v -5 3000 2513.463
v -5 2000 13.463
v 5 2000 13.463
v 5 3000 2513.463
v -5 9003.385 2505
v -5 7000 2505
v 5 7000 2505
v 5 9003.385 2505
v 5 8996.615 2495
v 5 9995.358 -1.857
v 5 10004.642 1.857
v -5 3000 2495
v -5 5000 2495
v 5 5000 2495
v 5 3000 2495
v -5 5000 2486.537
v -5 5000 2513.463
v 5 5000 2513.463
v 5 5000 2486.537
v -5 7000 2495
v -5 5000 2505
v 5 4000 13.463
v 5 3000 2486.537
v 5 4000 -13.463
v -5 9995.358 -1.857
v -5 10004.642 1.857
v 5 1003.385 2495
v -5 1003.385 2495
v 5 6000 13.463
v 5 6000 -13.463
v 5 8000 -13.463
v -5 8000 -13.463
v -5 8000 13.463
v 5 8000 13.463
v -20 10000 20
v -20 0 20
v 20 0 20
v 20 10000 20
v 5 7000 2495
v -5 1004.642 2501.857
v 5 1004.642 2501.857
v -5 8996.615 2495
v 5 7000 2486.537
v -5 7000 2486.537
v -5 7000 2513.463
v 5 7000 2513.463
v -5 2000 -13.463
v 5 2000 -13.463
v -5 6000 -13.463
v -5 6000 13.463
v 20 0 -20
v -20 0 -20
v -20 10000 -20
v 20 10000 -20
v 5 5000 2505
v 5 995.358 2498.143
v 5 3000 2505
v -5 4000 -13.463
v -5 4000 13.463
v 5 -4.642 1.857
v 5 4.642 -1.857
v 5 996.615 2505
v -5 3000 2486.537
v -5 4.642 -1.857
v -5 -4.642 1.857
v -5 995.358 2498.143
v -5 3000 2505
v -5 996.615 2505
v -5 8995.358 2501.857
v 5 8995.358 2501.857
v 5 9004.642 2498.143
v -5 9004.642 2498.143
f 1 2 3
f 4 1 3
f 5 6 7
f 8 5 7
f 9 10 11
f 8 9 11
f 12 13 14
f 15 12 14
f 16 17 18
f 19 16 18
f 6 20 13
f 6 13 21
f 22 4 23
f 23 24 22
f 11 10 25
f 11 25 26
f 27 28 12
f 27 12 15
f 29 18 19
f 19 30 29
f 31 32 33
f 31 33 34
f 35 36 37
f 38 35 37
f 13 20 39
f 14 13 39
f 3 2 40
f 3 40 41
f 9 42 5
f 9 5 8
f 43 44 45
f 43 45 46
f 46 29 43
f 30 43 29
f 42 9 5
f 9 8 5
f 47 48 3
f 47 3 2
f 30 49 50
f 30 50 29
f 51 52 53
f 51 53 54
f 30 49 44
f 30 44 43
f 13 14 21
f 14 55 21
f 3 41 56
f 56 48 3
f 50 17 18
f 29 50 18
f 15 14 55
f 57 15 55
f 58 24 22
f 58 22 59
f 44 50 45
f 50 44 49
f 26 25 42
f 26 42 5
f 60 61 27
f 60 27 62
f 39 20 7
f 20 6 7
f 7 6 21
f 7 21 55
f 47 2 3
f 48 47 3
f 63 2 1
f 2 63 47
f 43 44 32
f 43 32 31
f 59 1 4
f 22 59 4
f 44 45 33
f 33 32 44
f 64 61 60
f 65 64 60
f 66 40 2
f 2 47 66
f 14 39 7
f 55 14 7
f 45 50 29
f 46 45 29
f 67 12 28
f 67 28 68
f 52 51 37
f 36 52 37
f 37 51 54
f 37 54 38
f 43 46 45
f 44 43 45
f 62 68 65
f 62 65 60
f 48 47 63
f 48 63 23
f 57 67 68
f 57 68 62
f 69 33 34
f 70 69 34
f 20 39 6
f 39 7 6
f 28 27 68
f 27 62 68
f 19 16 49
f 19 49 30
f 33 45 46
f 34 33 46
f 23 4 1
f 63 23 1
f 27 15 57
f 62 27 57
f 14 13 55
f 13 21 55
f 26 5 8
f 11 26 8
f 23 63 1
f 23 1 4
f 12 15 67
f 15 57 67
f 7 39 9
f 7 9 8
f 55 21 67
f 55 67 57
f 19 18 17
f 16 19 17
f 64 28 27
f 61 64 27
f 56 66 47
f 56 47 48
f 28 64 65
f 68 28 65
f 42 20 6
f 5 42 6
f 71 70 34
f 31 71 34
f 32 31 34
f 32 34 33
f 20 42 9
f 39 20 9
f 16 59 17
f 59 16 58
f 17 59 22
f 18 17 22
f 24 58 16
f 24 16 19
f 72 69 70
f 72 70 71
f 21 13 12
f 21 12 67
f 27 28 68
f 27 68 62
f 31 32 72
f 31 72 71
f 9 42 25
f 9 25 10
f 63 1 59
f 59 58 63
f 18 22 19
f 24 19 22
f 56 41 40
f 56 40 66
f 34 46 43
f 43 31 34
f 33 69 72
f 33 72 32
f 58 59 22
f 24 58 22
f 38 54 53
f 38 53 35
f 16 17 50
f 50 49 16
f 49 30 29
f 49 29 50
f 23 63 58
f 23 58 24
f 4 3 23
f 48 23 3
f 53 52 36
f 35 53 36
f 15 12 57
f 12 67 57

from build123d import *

# Parameters (mm, degrees)
SKETCH150_W                    = 40
SKETCH150_H                    = 40
HW5_SMALLBEAM40_1_DEPTH        = 10000
SKETCH144_W                    = 10
SKETCH144_H                    = 10
HW5_SMALLBEAM10_1_DEPTH        = 2698.369749548
SKETCH144_ON_SEGMENT_2_W       = 10
SKETCH144_ON_SEGMENT_2_H       = 10
HW5_SMALLBEAM10_1_2_DEPTH      = 2006.787345981
SKETCH144_ON_SEGMENT_3_W       = 10
SKETCH144_ON_SEGMENT_3_H       = 10
HW5_SMALLBEAM10_1_3_DEPTH      = 2002
SKETCH144_ON_SEGMENT_4_W       = 10
SKETCH144_ON_SEGMENT_4_H       = 10
HW5_SMALLBEAM10_1_4_DEPTH      = 2002
SKETCH144_ON_SEGMENT_5_W       = 10
SKETCH144_ON_SEGMENT_5_H       = 10
HW5_SMALLBEAM10_1_5_DEPTH      = 2006.787345981
SKETCH144_ON_SEGMENT_6_W       = 10
SKETCH144_ON_SEGMENT_6_H       = 10
HW5_SMALLBEAM10_1_6_DEPTH      = 2698.369749548
SKETCH147_ON_SEGMENT_1_W       = 10
SKETCH147_ON_SEGMENT_1_H       = 10
HW5_SMALLBEAM10_2_DEPTH        = 2711.260073097
SKETCH147_ON_SEGMENT_2_W       = 10
SKETCH147_ON_SEGMENT_2_H       = 10
HW5_SMALLBEAM10_2_2_DEPTH      = 2729.937742627
SKETCH147_ON_SEGMENT_3_W       = 10
SKETCH147_ON_SEGMENT_3_H       = 10
HW5_SMALLBEAM10_2_3_DEPTH      = 2729.937742627
SKETCH147_ON_SEGMENT_4_W       = 10
SKETCH147_ON_SEGMENT_4_H       = 10
HW5_SMALLBEAM10_2_4_DEPTH      = 2729.937742627
SKETCH147_ON_SEGMENT_5_W       = 10
SKETCH147_ON_SEGMENT_5_H       = 10
HW5_SMALLBEAM10_2_5_DEPTH      = 2729.937742627
SKETCH147_ON_SEGMENT_6_W       = 10
SKETCH147_ON_SEGMENT_6_H       = 10
HW5_SMALLBEAM10_2_6_DEPTH      = 2729.937742627
SKETCH147_ON_SEGMENT_7_W       = 10
SKETCH147_ON_SEGMENT_7_H       = 10
HW5_SMALLBEAM10_2_7_DEPTH      = 2729.937742627
HW5_SMALLBEAM10_2_8_DEPTH      = 2692.582403567
HW5_SMALLBEAM10_2_8_DEPTH_BACK = 18.67766953
SKETCH147_W                    = 10
SKETCH147_H                    = 10


with BuildPart() as part:
    # Sketch150 → Hw5 SMALLBEAM40(1) (new body)
    with BuildSketch(Plane.ZX):
        Rectangle(SKETCH150_W, SKETCH150_H)
    extrude(amount=HW5_SMALLBEAM40_1_DEPTH)


with BuildPart() as body_2:
    # Sketch144 → Hw5 SMALLBEAM10(1) (new body)
    with BuildSketch(Plane(origin=(0, 0, 0), x_dir=(0, -0.9284766908852594, 0.3713906763541039), z_dir=(0, 0.3713906763541039, 0.9284766908852594))):
        Rectangle(SKETCH144_W, SKETCH144_H)
    extrude(amount=HW5_SMALLBEAM10_1_DEPTH)

    # Hw5 SMALLBEAM10(1) mitre 1
    split(bisect_by=Plane(origin=(0, 1000, 2500), x_dir=(1, 0, 0), z_dir=(0, -0.82806723, -0.560628809)), keep=Keep.TOP)


with BuildPart() as body_3:
    # Sketch144 on segment 2 (carried to segment 2) → Hw5 SMALLBEAM10_1 2 (new body)
    with BuildSketch(Plane(origin=(0, 994.212654019, 2500), x_dir=(0, 0, 1), z_dir=(0, 1, 0))):
        Rectangle(SKETCH144_ON_SEGMENT_2_W, SKETCH144_ON_SEGMENT_2_H)
    extrude(amount=HW5_SMALLBEAM10_1_2_DEPTH)

    # Hw5 SMALLBEAM10_1 2 mitre 1
    split(bisect_by=Plane(origin=(0, 3000, 2500), x_dir=(1, 0, 0), z_dir=(0, -1, 0)), keep=Keep.TOP)

    # Hw5 SMALLBEAM10_1 2 mitre 2
    split(bisect_by=Plane(origin=(0, 1000, 2500), x_dir=(-1, 0, 0), z_dir=(0, 0.82806723, 0.560628809)), keep=Keep.TOP)


with BuildPart() as body_4:
    # Sketch144 on segment 3 (carried to segment 3) → Hw5 SMALLBEAM10_1 3 (new body)
    with BuildSketch(Plane(origin=(0, 2999, 2500), x_dir=(0, 0, 1), z_dir=(0, 1, 0))):
        Rectangle(SKETCH144_ON_SEGMENT_3_W, SKETCH144_ON_SEGMENT_3_H)
    extrude(amount=HW5_SMALLBEAM10_1_3_DEPTH)

    # Hw5 SMALLBEAM10_1 3 mitre 1
    split(bisect_by=Plane(origin=(0, 5000, 2500), x_dir=(1, 0, 0), z_dir=(0, -1, 0)), keep=Keep.TOP)

    # Hw5 SMALLBEAM10_1 3 mitre 2
    split(bisect_by=Plane(origin=(0, 3000, 2500), x_dir=(-1, 0, 0), z_dir=(0, 1, 0)), keep=Keep.TOP)


with BuildPart() as body_5:
    # Sketch144 on segment 4 (carried to segment 4) → Hw5 SMALLBEAM10_1 4 (new body)
    with BuildSketch(Plane(origin=(0, 4999, 2500), x_dir=(0, 0, 1), z_dir=(0, 1, 0))):
        Rectangle(SKETCH144_ON_SEGMENT_4_W, SKETCH144_ON_SEGMENT_4_H)
    extrude(amount=HW5_SMALLBEAM10_1_4_DEPTH)

    # Hw5 SMALLBEAM10_1 4 mitre 1
    split(bisect_by=Plane(origin=(0, 7000, 2500), x_dir=(1, 0, 0), z_dir=(0, -1, 0)), keep=Keep.TOP)

    # Hw5 SMALLBEAM10_1 4 mitre 2
    split(bisect_by=Plane(origin=(0, 5000, 2500), x_dir=(-1, 0, 0), z_dir=(0, 1, 0)), keep=Keep.TOP)


with BuildPart() as body_6:
    # Sketch144 on segment 5 (carried to segment 5) → Hw5 SMALLBEAM10_1 5 (new body)
    with BuildSketch(Plane(origin=(0, 6999, 2500), x_dir=(0, 0, 1), z_dir=(0, 1, 0))):
        Rectangle(SKETCH144_ON_SEGMENT_5_W, SKETCH144_ON_SEGMENT_5_H)
    extrude(amount=HW5_SMALLBEAM10_1_5_DEPTH)

    # Hw5 SMALLBEAM10_1 5 mitre 1
    split(bisect_by=Plane(origin=(0, 9000, 2500), x_dir=(1, 0, 0), z_dir=(0, -0.82806723, 0.560628809)), keep=Keep.TOP)

    # Hw5 SMALLBEAM10_1 5 mitre 2
    split(bisect_by=Plane(origin=(0, 7000, 2500), x_dir=(-1, 0, 0), z_dir=(0, 1, 0)), keep=Keep.TOP)


with BuildPart() as body_7:
    # Sketch144 on segment 6 (carried to segment 6) → Hw5 SMALLBEAM10_1 6 (new body)
    with BuildSketch(Plane(origin=(0, 8997.850633662, 2505.373415846), x_dir=(0, 0.928476691, 0.371390676), z_dir=(0, 0.371390676, -0.928476691))):
        Rectangle(SKETCH144_ON_SEGMENT_6_W, SKETCH144_ON_SEGMENT_6_H)
    extrude(amount=HW5_SMALLBEAM10_1_6_DEPTH)

    # Hw5 SMALLBEAM10_1 6 mitre 1
    split(bisect_by=Plane(origin=(0, 9000, 2500), x_dir=(-1, 0, 0), z_dir=(0, 0.82806723, -0.560628809)), keep=Keep.TOP)


with BuildPart() as body_8:
    # Sketch147 on segment 1 (carried to segment 1) → Hw5 SMALLBEAM10(2) (new body)
    with BuildSketch(Plane(origin=(0, 9000, 2500), x_dir=(0, 0.928476691, -0.371390676), z_dir=(0, -0.371390676, -0.928476691))):
        Rectangle(SKETCH147_ON_SEGMENT_1_W, SKETCH147_ON_SEGMENT_1_H)
    extrude(amount=HW5_SMALLBEAM10_2_DEPTH)

    # Hw5 SMALLBEAM10(2) mitre 1
    split(bisect_by=Plane(origin=(0, 8000, 0), x_dir=(-1, 0, 0), z_dir=(0, 1, 0)), keep=Keep.TOP)


with BuildPart() as body_9:
    # Sketch147 on segment 2 (carried to segment 2) → Hw5 SMALLBEAM10_2 2 (new body)
    with BuildSketch(Plane(origin=(0, 8006.936712319, -17.341780798), x_dir=(0, -0.928476691, -0.371390676), z_dir=(0, -0.371390676, 0.928476691))):
        Rectangle(SKETCH147_ON_SEGMENT_2_W, SKETCH147_ON_SEGMENT_2_H)
    extrude(amount=HW5_SMALLBEAM10_2_2_DEPTH)

    # Hw5 SMALLBEAM10_2 2 mitre 1
    split(bisect_by=Plane.XZ.offset(-8000), keep=Keep.TOP)

    # Hw5 SMALLBEAM10_2 2 mitre 2
    split(bisect_by=Plane(origin=(0, 7000, 2500), x_dir=(-1, 0, 0), z_dir=(0, 1, 0)), keep=Keep.TOP)


with BuildPart() as body_10:
    # Sketch147 on segment 3 (carried to segment 3) → Hw5 SMALLBEAM10_2 3 (new body)
    with BuildSketch(Plane(origin=(0, 7006.936712319, 2517.341780798), x_dir=(0, 0.928476691, -0.371390676), z_dir=(0, -0.371390676, -0.928476691))):
        Rectangle(SKETCH147_ON_SEGMENT_3_W, SKETCH147_ON_SEGMENT_3_H)
    extrude(amount=HW5_SMALLBEAM10_2_3_DEPTH)

    # Hw5 SMALLBEAM10_2 3 mitre 1
    split(bisect_by=Plane(origin=(0, 7000, 2500), x_dir=(1, 0, 0), z_dir=(0, -1, 0)), keep=Keep.TOP)

    # Hw5 SMALLBEAM10_2 3 mitre 2
    split(bisect_by=Plane(origin=(0, 6000, 0), x_dir=(-1, 0, 0), z_dir=(0, 1, 0)), keep=Keep.TOP)


with BuildPart() as body_11:
    # Sketch147 on segment 4 (carried to segment 4) → Hw5 SMALLBEAM10_2 4 (new body)
    with BuildSketch(Plane(origin=(0, 6006.936712319, -17.341780798), x_dir=(0, -0.928476691, -0.371390676), z_dir=(0, -0.371390676, 0.928476691))):
        Rectangle(SKETCH147_ON_SEGMENT_4_W, SKETCH147_ON_SEGMENT_4_H)
    extrude(amount=HW5_SMALLBEAM10_2_4_DEPTH)

    # Hw5 SMALLBEAM10_2 4 mitre 1
    split(bisect_by=Plane.XZ.offset(-6000), keep=Keep.TOP)

    # Hw5 SMALLBEAM10_2 4 mitre 2
    split(bisect_by=Plane(origin=(0, 5000, 2500), x_dir=(-1, 0, 0), z_dir=(0, 1, 0)), keep=Keep.TOP)


with BuildPart() as body_12:
    # Sketch147 on segment 5 (carried to segment 5) → Hw5 SMALLBEAM10_2 5 (new body)
    with BuildSketch(Plane(origin=(0, 5006.936712319, 2517.341780798), x_dir=(0, 0.928476691, -0.371390676), z_dir=(0, -0.371390676, -0.928476691))):
        Rectangle(SKETCH147_ON_SEGMENT_5_W, SKETCH147_ON_SEGMENT_5_H)
    extrude(amount=HW5_SMALLBEAM10_2_5_DEPTH)

    # Hw5 SMALLBEAM10_2 5 mitre 1
    split(bisect_by=Plane(origin=(0, 5000, 2500), x_dir=(1, 0, 0), z_dir=(0, -1, 0)), keep=Keep.TOP)

    # Hw5 SMALLBEAM10_2 5 mitre 2
    split(bisect_by=Plane(origin=(0, 4000, 0), x_dir=(-1, 0, 0), z_dir=(0, 1, 0)), keep=Keep.TOP)


with BuildPart() as body_13:
    # Sketch147 on segment 6 (carried to segment 6) → Hw5 SMALLBEAM10_2 6 (new body)
    with BuildSketch(Plane(origin=(0, 4006.936712319, -17.341780798), x_dir=(0, -0.928476691, -0.371390676), z_dir=(0, -0.371390676, 0.928476691))):
        Rectangle(SKETCH147_ON_SEGMENT_6_W, SKETCH147_ON_SEGMENT_6_H)
    extrude(amount=HW5_SMALLBEAM10_2_6_DEPTH)

    # Hw5 SMALLBEAM10_2 6 mitre 1
    split(bisect_by=Plane.XZ.offset(-4000), keep=Keep.TOP)

    # Hw5 SMALLBEAM10_2 6 mitre 2
    split(bisect_by=Plane(origin=(0, 3000, 2500), x_dir=(-1, 0, 0), z_dir=(0, 1, 0)), keep=Keep.TOP)


with BuildPart() as body_14:
    # Sketch147 on segment 7 (carried to segment 7) → Hw5 SMALLBEAM10_2 7 (new body)
    with BuildSketch(Plane(origin=(0, 3006.936712319, 2517.341780798), x_dir=(0, 0.928476691, -0.371390676), z_dir=(0, -0.371390676, -0.928476691))):
        Rectangle(SKETCH147_ON_SEGMENT_7_W, SKETCH147_ON_SEGMENT_7_H)
    extrude(amount=HW5_SMALLBEAM10_2_7_DEPTH)

    # Hw5 SMALLBEAM10_2 7 mitre 1
    split(bisect_by=Plane(origin=(0, 3000, 2500), x_dir=(1, 0, 0), z_dir=(0, -1, 0)), keep=Keep.TOP)

    # Hw5 SMALLBEAM10_2 7 mitre 2
    split(bisect_by=Plane(origin=(0, 2000, 0), x_dir=(-1, 0, 0), z_dir=(0, 1, 0)), keep=Keep.TOP)


with BuildPart() as body_15:
    # Sketch147 → Hw5 SMALLBEAM10_2 8 (new, two sides: drawn at the far end of the back side and taken through both)
    with BuildSketch(Plane(origin=(0, 2000, 0), x_dir=(0, -0.9284766908852595, -0.37139067635410344), z_dir=(0, -0.37139067635410344, 0.9284766908852595)).offset(-HW5_SMALLBEAM10_2_8_DEPTH_BACK)):
        Rectangle(SKETCH147_W, SKETCH147_H)
    extrude(amount=HW5_SMALLBEAM10_2_8_DEPTH + HW5_SMALLBEAM10_2_8_DEPTH_BACK)

    # Hw5 SMALLBEAM10_2 8 mitre 1
    split(bisect_by=Plane.XZ.offset(-2000), keep=Keep.TOP)


solid = Compound([part.part, body_2.part, body_3.part, body_4.part, body_5.part, body_6.part, body_7.part, body_8.part, body_9.part, body_10.part, body_11.part, body_12.part, body_13.part, body_14.part, body_15.part])
